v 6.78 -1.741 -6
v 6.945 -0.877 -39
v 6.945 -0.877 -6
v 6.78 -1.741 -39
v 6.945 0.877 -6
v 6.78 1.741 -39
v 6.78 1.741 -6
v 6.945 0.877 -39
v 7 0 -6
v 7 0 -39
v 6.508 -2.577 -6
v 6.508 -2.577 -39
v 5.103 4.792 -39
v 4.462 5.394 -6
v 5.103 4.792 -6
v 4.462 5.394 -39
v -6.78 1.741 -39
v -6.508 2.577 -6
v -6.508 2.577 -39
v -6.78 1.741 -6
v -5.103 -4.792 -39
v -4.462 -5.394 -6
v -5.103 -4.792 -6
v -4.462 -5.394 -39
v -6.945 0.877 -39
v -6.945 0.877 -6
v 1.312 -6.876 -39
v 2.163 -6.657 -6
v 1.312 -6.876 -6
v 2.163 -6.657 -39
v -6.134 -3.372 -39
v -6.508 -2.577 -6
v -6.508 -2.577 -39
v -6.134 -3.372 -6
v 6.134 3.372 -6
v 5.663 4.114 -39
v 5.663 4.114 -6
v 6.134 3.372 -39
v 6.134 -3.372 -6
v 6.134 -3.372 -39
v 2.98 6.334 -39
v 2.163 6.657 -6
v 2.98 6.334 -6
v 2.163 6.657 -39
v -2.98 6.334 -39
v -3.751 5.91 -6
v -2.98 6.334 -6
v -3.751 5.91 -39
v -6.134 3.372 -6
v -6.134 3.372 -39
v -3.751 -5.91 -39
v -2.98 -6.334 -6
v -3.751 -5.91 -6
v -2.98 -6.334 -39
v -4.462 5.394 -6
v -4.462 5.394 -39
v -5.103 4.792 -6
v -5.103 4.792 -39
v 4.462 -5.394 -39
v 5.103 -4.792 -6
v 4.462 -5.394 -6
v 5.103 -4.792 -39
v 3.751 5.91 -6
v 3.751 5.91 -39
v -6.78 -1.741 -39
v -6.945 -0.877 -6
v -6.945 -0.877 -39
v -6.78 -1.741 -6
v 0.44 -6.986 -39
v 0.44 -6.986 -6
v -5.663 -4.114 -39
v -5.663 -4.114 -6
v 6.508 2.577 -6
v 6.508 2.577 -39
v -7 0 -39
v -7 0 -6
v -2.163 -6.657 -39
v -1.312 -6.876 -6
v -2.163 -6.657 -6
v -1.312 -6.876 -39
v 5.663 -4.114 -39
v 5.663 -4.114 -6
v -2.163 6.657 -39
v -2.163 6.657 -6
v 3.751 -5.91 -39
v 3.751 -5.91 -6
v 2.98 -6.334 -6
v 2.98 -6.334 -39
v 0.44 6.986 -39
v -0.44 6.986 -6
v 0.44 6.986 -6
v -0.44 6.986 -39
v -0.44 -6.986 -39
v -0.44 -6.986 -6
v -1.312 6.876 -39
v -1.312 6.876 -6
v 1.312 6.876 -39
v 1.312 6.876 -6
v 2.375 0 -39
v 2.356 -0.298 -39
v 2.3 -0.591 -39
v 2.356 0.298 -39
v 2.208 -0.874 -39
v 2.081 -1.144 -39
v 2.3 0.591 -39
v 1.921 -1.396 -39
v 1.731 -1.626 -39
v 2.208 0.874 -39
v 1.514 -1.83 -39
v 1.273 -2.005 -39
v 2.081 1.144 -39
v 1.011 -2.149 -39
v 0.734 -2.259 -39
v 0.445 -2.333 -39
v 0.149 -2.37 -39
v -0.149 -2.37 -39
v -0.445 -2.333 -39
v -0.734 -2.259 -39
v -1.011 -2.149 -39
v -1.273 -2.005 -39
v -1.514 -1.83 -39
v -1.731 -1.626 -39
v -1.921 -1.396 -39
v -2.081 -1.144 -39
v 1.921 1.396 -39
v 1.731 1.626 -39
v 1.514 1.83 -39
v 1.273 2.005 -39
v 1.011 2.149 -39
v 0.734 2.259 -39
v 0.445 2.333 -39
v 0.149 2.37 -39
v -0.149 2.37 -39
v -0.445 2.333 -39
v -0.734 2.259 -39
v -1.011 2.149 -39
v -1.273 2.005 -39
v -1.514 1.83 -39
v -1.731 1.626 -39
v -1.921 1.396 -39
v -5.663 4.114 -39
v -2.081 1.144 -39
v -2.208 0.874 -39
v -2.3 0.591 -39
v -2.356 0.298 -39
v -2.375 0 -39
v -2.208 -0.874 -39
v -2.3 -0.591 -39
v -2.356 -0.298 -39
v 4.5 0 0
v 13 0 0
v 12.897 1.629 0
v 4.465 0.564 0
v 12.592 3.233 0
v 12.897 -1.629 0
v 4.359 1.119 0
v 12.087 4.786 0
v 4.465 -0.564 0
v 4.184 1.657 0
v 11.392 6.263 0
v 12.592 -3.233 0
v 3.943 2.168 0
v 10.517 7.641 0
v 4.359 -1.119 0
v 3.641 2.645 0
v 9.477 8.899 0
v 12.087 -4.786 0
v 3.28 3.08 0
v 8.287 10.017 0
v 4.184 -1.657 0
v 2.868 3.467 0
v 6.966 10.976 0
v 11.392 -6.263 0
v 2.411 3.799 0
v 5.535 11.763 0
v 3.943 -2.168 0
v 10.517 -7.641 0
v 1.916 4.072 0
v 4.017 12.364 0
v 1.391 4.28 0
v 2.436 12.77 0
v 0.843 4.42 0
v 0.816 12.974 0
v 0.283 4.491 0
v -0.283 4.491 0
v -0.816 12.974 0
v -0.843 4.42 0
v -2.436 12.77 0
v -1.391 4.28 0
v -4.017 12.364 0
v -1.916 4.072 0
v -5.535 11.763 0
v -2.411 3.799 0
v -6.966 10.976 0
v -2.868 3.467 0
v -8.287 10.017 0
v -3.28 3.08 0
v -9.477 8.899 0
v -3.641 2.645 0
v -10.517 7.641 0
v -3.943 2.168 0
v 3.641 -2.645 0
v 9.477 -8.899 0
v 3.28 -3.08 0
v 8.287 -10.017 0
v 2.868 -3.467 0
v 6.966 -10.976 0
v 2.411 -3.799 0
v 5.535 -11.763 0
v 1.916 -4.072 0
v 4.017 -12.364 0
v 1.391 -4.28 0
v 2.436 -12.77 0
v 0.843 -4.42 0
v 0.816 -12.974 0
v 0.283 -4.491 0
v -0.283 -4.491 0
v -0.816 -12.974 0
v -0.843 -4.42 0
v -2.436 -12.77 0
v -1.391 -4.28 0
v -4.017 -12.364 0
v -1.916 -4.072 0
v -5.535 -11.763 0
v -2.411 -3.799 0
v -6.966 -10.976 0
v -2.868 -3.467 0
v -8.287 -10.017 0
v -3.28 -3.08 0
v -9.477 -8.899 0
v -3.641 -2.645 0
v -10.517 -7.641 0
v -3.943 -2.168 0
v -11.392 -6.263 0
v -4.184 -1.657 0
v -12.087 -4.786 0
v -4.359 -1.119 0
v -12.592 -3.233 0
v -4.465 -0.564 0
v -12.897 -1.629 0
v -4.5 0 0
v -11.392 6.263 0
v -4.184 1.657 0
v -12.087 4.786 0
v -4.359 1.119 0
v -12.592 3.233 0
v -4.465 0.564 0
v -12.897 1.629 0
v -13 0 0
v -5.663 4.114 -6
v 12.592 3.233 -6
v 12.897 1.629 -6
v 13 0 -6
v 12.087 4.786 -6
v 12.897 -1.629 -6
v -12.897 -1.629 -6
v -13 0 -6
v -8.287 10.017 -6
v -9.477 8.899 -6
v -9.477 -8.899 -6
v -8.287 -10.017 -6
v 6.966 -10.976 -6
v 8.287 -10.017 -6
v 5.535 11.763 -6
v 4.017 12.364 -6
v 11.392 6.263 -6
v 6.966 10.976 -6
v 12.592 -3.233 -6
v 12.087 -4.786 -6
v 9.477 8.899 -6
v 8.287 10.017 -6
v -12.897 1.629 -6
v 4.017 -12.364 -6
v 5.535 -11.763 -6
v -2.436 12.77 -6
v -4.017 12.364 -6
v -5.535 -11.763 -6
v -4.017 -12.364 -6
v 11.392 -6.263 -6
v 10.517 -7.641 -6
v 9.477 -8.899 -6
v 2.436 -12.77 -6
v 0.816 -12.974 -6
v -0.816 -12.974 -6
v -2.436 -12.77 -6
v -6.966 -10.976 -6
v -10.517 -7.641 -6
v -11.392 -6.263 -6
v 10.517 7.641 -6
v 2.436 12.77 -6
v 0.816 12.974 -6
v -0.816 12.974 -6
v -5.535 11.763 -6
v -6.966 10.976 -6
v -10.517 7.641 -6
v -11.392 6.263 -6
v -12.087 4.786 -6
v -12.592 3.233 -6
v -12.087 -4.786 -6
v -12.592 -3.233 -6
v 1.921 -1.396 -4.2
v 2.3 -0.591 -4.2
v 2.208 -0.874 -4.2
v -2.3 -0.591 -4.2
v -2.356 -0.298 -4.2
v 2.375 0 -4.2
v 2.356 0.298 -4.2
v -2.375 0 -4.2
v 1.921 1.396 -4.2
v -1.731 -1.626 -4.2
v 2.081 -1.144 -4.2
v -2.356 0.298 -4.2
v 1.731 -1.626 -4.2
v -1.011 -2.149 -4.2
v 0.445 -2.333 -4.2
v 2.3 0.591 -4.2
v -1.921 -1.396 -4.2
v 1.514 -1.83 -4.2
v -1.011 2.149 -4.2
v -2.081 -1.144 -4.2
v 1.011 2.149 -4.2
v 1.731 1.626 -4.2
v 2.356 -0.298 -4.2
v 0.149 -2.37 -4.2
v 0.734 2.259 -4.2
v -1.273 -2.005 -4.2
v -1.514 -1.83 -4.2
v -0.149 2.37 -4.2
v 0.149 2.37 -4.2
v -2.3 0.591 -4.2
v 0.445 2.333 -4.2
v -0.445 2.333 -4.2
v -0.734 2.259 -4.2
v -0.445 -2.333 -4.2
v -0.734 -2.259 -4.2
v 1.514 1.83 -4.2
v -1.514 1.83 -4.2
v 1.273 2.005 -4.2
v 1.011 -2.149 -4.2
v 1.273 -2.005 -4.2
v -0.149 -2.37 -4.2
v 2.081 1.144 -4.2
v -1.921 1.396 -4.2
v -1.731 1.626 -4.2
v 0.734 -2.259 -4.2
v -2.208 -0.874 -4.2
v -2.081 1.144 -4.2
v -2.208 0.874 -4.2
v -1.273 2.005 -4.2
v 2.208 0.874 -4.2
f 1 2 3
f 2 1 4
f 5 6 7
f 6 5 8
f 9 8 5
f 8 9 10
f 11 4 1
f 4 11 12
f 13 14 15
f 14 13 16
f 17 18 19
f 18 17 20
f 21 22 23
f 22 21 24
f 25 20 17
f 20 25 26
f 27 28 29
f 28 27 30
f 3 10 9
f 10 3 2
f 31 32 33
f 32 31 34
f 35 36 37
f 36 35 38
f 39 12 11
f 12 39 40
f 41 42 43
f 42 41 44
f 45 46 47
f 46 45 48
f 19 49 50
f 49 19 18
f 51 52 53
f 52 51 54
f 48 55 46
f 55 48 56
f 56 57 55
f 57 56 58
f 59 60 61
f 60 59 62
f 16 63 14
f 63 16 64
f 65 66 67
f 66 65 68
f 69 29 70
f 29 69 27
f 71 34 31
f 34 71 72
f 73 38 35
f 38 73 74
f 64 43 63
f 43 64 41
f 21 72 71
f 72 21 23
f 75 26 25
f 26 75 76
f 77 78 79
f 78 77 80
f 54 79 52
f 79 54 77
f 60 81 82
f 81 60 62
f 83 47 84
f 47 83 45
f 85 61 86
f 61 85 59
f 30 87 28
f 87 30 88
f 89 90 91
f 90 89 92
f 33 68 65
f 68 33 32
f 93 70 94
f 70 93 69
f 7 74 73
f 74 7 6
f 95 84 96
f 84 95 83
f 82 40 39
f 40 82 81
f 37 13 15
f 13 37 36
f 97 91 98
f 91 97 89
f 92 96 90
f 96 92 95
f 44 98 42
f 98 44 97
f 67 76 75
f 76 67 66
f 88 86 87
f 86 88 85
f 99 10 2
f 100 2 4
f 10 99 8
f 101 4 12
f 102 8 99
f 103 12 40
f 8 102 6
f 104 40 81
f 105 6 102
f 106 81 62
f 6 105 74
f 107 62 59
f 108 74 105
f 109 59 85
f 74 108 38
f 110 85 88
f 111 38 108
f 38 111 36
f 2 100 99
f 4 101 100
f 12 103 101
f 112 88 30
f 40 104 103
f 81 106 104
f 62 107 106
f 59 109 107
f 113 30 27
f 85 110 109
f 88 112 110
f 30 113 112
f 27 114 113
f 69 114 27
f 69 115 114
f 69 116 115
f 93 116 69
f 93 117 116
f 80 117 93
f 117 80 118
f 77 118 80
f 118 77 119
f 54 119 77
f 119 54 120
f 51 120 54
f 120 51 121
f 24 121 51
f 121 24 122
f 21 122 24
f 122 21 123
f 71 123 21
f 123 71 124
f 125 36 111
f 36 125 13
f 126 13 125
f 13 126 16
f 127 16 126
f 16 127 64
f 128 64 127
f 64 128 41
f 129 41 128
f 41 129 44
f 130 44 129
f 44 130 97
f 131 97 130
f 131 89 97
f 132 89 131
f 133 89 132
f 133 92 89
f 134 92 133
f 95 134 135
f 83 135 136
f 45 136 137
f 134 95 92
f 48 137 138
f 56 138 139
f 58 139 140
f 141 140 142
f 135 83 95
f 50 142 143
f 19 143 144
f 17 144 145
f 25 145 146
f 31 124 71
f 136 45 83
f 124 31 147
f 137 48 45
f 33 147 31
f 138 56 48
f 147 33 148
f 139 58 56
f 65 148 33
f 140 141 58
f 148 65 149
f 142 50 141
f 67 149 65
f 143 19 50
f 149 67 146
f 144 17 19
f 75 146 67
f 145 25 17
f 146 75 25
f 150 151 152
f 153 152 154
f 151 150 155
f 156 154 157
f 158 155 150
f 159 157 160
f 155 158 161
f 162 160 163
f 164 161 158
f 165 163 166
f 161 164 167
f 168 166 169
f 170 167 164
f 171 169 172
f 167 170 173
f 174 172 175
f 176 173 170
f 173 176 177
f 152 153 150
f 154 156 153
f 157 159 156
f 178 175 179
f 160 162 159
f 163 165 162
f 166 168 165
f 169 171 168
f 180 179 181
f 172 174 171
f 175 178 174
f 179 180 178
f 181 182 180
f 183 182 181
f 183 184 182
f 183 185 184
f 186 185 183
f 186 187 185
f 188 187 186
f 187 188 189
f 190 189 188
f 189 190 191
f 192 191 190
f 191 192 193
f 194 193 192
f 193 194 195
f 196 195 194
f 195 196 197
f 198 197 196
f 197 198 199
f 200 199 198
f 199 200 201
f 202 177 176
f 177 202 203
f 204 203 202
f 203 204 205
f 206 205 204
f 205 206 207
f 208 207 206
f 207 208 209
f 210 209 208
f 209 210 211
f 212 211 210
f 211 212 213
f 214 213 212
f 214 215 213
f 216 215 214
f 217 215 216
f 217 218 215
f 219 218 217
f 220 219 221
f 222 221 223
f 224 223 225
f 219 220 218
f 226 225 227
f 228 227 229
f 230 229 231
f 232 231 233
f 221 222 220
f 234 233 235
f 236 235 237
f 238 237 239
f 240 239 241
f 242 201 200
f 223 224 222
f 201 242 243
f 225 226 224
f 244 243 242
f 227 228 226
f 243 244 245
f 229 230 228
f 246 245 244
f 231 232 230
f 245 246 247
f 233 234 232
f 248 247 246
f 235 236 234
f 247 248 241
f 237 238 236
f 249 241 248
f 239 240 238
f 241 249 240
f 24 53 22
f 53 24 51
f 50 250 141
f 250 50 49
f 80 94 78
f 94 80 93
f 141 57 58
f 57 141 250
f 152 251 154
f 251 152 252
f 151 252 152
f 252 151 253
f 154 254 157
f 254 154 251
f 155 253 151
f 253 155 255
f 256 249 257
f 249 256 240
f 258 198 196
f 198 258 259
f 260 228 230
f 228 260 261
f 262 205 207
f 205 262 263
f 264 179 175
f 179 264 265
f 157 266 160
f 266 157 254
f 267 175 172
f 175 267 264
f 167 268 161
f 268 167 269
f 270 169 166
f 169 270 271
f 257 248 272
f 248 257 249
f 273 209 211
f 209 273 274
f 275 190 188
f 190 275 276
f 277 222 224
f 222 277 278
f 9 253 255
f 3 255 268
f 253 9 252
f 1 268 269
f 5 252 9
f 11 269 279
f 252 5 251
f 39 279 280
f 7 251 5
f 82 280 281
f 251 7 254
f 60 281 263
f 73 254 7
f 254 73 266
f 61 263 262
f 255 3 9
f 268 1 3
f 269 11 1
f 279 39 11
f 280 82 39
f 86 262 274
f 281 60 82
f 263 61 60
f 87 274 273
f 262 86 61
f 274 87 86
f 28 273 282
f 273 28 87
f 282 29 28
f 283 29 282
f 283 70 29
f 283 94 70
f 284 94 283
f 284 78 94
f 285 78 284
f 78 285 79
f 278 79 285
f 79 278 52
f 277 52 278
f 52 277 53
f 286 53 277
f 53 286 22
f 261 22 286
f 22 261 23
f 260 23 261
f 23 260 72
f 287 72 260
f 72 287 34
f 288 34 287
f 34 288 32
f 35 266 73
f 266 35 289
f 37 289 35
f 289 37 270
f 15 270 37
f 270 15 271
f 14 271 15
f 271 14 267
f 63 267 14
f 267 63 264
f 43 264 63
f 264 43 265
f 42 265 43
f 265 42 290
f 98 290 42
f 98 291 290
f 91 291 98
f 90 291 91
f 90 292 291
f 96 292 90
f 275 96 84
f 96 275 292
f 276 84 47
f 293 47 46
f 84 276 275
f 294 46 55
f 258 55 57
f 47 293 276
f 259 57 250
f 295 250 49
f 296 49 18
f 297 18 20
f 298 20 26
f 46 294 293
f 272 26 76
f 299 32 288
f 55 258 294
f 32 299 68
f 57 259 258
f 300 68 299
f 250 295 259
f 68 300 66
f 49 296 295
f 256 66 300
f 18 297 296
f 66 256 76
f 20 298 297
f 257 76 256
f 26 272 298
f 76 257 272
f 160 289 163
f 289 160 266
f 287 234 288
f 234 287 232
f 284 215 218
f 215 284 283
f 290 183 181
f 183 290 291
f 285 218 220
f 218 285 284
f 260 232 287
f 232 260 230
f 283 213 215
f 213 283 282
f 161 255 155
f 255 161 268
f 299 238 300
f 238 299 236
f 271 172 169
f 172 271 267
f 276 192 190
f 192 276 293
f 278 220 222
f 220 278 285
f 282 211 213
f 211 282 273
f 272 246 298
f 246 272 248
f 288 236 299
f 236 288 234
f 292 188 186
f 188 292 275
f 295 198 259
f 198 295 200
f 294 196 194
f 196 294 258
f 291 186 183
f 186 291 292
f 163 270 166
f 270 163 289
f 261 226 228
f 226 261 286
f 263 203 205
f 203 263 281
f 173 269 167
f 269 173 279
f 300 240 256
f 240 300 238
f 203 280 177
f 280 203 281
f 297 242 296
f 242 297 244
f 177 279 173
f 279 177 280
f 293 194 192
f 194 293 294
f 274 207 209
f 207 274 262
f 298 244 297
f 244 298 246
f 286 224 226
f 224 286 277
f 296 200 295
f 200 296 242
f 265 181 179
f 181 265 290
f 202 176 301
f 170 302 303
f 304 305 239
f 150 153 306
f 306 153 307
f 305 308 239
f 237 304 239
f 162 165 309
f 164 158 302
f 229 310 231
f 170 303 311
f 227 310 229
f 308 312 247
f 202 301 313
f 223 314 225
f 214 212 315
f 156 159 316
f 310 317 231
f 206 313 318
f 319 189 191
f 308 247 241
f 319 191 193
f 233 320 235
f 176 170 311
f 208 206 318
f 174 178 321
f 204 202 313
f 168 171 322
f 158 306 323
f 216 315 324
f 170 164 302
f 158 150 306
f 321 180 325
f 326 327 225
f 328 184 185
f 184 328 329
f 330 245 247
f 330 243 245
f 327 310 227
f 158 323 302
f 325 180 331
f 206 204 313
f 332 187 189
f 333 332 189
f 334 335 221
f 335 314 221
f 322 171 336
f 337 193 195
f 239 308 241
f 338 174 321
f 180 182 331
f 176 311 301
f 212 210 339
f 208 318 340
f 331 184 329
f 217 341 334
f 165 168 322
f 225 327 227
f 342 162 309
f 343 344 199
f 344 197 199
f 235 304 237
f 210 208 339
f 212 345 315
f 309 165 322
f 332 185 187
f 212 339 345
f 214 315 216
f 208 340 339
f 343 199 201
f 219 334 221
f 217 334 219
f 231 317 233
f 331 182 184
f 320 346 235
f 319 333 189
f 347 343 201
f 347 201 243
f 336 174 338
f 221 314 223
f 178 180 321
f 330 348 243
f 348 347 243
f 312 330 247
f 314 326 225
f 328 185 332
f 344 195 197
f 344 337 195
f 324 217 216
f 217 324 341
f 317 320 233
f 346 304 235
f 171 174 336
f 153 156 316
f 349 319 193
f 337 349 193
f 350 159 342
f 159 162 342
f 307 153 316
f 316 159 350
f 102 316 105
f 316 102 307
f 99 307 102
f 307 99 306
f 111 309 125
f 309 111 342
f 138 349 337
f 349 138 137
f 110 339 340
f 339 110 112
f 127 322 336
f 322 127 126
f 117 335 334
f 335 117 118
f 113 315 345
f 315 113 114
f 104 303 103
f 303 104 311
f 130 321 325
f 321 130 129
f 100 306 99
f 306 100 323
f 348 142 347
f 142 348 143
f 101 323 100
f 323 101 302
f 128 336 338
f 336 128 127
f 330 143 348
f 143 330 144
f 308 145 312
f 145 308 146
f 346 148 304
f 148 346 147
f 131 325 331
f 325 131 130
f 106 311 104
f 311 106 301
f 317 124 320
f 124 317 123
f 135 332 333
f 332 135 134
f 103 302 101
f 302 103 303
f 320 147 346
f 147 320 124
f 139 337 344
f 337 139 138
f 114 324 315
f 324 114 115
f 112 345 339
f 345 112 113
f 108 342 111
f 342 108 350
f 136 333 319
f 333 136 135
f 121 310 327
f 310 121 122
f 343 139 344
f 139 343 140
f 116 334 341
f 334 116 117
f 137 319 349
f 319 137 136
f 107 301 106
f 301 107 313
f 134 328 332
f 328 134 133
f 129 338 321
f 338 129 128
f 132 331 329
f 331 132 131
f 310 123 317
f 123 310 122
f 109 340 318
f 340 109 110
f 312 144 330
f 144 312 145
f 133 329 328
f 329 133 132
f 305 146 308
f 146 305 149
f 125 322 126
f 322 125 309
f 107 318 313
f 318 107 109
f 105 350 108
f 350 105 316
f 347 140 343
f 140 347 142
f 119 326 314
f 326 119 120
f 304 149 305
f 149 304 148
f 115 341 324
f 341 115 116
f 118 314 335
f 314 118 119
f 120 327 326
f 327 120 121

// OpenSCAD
$fn = 50;


difference() {
	union() {
		translate(v = [0, 0, -39.0000000000]) {
			cylinder(h = 39, r = 7.0000000000);
		}
		translate(v = [0, 0, -6.0000000000]) {
			cylinder(h = 6, r = 13.0000000000);
		}
	}
	union() {
		translate(v = [0, 0, 0]) {
			rotate(a = [0, 0, 0]) {
				difference() {
					union() {
						#translate(v = [0, 0, -39.0000000000]) {
							cylinder(h = 39, r = 2.2500000000);
						}
						#translate(v = [0, 0, -4.2000000000]) {
							cylinder(h = 4.2000000000, r1 = 2.3750000000, r2 = 4.5000000000);
						}
						#translate(v = [0, 0, -39.0000000000]) {
							cylinder(h = 39, r = 2.3750000000);
						}
						#translate(v = [0, 0, -39.0000000000]) {
							cylinder(h = 39, r = 2.2500000000);
						}
					}
					union();
				}
			}
		}
	}
}
